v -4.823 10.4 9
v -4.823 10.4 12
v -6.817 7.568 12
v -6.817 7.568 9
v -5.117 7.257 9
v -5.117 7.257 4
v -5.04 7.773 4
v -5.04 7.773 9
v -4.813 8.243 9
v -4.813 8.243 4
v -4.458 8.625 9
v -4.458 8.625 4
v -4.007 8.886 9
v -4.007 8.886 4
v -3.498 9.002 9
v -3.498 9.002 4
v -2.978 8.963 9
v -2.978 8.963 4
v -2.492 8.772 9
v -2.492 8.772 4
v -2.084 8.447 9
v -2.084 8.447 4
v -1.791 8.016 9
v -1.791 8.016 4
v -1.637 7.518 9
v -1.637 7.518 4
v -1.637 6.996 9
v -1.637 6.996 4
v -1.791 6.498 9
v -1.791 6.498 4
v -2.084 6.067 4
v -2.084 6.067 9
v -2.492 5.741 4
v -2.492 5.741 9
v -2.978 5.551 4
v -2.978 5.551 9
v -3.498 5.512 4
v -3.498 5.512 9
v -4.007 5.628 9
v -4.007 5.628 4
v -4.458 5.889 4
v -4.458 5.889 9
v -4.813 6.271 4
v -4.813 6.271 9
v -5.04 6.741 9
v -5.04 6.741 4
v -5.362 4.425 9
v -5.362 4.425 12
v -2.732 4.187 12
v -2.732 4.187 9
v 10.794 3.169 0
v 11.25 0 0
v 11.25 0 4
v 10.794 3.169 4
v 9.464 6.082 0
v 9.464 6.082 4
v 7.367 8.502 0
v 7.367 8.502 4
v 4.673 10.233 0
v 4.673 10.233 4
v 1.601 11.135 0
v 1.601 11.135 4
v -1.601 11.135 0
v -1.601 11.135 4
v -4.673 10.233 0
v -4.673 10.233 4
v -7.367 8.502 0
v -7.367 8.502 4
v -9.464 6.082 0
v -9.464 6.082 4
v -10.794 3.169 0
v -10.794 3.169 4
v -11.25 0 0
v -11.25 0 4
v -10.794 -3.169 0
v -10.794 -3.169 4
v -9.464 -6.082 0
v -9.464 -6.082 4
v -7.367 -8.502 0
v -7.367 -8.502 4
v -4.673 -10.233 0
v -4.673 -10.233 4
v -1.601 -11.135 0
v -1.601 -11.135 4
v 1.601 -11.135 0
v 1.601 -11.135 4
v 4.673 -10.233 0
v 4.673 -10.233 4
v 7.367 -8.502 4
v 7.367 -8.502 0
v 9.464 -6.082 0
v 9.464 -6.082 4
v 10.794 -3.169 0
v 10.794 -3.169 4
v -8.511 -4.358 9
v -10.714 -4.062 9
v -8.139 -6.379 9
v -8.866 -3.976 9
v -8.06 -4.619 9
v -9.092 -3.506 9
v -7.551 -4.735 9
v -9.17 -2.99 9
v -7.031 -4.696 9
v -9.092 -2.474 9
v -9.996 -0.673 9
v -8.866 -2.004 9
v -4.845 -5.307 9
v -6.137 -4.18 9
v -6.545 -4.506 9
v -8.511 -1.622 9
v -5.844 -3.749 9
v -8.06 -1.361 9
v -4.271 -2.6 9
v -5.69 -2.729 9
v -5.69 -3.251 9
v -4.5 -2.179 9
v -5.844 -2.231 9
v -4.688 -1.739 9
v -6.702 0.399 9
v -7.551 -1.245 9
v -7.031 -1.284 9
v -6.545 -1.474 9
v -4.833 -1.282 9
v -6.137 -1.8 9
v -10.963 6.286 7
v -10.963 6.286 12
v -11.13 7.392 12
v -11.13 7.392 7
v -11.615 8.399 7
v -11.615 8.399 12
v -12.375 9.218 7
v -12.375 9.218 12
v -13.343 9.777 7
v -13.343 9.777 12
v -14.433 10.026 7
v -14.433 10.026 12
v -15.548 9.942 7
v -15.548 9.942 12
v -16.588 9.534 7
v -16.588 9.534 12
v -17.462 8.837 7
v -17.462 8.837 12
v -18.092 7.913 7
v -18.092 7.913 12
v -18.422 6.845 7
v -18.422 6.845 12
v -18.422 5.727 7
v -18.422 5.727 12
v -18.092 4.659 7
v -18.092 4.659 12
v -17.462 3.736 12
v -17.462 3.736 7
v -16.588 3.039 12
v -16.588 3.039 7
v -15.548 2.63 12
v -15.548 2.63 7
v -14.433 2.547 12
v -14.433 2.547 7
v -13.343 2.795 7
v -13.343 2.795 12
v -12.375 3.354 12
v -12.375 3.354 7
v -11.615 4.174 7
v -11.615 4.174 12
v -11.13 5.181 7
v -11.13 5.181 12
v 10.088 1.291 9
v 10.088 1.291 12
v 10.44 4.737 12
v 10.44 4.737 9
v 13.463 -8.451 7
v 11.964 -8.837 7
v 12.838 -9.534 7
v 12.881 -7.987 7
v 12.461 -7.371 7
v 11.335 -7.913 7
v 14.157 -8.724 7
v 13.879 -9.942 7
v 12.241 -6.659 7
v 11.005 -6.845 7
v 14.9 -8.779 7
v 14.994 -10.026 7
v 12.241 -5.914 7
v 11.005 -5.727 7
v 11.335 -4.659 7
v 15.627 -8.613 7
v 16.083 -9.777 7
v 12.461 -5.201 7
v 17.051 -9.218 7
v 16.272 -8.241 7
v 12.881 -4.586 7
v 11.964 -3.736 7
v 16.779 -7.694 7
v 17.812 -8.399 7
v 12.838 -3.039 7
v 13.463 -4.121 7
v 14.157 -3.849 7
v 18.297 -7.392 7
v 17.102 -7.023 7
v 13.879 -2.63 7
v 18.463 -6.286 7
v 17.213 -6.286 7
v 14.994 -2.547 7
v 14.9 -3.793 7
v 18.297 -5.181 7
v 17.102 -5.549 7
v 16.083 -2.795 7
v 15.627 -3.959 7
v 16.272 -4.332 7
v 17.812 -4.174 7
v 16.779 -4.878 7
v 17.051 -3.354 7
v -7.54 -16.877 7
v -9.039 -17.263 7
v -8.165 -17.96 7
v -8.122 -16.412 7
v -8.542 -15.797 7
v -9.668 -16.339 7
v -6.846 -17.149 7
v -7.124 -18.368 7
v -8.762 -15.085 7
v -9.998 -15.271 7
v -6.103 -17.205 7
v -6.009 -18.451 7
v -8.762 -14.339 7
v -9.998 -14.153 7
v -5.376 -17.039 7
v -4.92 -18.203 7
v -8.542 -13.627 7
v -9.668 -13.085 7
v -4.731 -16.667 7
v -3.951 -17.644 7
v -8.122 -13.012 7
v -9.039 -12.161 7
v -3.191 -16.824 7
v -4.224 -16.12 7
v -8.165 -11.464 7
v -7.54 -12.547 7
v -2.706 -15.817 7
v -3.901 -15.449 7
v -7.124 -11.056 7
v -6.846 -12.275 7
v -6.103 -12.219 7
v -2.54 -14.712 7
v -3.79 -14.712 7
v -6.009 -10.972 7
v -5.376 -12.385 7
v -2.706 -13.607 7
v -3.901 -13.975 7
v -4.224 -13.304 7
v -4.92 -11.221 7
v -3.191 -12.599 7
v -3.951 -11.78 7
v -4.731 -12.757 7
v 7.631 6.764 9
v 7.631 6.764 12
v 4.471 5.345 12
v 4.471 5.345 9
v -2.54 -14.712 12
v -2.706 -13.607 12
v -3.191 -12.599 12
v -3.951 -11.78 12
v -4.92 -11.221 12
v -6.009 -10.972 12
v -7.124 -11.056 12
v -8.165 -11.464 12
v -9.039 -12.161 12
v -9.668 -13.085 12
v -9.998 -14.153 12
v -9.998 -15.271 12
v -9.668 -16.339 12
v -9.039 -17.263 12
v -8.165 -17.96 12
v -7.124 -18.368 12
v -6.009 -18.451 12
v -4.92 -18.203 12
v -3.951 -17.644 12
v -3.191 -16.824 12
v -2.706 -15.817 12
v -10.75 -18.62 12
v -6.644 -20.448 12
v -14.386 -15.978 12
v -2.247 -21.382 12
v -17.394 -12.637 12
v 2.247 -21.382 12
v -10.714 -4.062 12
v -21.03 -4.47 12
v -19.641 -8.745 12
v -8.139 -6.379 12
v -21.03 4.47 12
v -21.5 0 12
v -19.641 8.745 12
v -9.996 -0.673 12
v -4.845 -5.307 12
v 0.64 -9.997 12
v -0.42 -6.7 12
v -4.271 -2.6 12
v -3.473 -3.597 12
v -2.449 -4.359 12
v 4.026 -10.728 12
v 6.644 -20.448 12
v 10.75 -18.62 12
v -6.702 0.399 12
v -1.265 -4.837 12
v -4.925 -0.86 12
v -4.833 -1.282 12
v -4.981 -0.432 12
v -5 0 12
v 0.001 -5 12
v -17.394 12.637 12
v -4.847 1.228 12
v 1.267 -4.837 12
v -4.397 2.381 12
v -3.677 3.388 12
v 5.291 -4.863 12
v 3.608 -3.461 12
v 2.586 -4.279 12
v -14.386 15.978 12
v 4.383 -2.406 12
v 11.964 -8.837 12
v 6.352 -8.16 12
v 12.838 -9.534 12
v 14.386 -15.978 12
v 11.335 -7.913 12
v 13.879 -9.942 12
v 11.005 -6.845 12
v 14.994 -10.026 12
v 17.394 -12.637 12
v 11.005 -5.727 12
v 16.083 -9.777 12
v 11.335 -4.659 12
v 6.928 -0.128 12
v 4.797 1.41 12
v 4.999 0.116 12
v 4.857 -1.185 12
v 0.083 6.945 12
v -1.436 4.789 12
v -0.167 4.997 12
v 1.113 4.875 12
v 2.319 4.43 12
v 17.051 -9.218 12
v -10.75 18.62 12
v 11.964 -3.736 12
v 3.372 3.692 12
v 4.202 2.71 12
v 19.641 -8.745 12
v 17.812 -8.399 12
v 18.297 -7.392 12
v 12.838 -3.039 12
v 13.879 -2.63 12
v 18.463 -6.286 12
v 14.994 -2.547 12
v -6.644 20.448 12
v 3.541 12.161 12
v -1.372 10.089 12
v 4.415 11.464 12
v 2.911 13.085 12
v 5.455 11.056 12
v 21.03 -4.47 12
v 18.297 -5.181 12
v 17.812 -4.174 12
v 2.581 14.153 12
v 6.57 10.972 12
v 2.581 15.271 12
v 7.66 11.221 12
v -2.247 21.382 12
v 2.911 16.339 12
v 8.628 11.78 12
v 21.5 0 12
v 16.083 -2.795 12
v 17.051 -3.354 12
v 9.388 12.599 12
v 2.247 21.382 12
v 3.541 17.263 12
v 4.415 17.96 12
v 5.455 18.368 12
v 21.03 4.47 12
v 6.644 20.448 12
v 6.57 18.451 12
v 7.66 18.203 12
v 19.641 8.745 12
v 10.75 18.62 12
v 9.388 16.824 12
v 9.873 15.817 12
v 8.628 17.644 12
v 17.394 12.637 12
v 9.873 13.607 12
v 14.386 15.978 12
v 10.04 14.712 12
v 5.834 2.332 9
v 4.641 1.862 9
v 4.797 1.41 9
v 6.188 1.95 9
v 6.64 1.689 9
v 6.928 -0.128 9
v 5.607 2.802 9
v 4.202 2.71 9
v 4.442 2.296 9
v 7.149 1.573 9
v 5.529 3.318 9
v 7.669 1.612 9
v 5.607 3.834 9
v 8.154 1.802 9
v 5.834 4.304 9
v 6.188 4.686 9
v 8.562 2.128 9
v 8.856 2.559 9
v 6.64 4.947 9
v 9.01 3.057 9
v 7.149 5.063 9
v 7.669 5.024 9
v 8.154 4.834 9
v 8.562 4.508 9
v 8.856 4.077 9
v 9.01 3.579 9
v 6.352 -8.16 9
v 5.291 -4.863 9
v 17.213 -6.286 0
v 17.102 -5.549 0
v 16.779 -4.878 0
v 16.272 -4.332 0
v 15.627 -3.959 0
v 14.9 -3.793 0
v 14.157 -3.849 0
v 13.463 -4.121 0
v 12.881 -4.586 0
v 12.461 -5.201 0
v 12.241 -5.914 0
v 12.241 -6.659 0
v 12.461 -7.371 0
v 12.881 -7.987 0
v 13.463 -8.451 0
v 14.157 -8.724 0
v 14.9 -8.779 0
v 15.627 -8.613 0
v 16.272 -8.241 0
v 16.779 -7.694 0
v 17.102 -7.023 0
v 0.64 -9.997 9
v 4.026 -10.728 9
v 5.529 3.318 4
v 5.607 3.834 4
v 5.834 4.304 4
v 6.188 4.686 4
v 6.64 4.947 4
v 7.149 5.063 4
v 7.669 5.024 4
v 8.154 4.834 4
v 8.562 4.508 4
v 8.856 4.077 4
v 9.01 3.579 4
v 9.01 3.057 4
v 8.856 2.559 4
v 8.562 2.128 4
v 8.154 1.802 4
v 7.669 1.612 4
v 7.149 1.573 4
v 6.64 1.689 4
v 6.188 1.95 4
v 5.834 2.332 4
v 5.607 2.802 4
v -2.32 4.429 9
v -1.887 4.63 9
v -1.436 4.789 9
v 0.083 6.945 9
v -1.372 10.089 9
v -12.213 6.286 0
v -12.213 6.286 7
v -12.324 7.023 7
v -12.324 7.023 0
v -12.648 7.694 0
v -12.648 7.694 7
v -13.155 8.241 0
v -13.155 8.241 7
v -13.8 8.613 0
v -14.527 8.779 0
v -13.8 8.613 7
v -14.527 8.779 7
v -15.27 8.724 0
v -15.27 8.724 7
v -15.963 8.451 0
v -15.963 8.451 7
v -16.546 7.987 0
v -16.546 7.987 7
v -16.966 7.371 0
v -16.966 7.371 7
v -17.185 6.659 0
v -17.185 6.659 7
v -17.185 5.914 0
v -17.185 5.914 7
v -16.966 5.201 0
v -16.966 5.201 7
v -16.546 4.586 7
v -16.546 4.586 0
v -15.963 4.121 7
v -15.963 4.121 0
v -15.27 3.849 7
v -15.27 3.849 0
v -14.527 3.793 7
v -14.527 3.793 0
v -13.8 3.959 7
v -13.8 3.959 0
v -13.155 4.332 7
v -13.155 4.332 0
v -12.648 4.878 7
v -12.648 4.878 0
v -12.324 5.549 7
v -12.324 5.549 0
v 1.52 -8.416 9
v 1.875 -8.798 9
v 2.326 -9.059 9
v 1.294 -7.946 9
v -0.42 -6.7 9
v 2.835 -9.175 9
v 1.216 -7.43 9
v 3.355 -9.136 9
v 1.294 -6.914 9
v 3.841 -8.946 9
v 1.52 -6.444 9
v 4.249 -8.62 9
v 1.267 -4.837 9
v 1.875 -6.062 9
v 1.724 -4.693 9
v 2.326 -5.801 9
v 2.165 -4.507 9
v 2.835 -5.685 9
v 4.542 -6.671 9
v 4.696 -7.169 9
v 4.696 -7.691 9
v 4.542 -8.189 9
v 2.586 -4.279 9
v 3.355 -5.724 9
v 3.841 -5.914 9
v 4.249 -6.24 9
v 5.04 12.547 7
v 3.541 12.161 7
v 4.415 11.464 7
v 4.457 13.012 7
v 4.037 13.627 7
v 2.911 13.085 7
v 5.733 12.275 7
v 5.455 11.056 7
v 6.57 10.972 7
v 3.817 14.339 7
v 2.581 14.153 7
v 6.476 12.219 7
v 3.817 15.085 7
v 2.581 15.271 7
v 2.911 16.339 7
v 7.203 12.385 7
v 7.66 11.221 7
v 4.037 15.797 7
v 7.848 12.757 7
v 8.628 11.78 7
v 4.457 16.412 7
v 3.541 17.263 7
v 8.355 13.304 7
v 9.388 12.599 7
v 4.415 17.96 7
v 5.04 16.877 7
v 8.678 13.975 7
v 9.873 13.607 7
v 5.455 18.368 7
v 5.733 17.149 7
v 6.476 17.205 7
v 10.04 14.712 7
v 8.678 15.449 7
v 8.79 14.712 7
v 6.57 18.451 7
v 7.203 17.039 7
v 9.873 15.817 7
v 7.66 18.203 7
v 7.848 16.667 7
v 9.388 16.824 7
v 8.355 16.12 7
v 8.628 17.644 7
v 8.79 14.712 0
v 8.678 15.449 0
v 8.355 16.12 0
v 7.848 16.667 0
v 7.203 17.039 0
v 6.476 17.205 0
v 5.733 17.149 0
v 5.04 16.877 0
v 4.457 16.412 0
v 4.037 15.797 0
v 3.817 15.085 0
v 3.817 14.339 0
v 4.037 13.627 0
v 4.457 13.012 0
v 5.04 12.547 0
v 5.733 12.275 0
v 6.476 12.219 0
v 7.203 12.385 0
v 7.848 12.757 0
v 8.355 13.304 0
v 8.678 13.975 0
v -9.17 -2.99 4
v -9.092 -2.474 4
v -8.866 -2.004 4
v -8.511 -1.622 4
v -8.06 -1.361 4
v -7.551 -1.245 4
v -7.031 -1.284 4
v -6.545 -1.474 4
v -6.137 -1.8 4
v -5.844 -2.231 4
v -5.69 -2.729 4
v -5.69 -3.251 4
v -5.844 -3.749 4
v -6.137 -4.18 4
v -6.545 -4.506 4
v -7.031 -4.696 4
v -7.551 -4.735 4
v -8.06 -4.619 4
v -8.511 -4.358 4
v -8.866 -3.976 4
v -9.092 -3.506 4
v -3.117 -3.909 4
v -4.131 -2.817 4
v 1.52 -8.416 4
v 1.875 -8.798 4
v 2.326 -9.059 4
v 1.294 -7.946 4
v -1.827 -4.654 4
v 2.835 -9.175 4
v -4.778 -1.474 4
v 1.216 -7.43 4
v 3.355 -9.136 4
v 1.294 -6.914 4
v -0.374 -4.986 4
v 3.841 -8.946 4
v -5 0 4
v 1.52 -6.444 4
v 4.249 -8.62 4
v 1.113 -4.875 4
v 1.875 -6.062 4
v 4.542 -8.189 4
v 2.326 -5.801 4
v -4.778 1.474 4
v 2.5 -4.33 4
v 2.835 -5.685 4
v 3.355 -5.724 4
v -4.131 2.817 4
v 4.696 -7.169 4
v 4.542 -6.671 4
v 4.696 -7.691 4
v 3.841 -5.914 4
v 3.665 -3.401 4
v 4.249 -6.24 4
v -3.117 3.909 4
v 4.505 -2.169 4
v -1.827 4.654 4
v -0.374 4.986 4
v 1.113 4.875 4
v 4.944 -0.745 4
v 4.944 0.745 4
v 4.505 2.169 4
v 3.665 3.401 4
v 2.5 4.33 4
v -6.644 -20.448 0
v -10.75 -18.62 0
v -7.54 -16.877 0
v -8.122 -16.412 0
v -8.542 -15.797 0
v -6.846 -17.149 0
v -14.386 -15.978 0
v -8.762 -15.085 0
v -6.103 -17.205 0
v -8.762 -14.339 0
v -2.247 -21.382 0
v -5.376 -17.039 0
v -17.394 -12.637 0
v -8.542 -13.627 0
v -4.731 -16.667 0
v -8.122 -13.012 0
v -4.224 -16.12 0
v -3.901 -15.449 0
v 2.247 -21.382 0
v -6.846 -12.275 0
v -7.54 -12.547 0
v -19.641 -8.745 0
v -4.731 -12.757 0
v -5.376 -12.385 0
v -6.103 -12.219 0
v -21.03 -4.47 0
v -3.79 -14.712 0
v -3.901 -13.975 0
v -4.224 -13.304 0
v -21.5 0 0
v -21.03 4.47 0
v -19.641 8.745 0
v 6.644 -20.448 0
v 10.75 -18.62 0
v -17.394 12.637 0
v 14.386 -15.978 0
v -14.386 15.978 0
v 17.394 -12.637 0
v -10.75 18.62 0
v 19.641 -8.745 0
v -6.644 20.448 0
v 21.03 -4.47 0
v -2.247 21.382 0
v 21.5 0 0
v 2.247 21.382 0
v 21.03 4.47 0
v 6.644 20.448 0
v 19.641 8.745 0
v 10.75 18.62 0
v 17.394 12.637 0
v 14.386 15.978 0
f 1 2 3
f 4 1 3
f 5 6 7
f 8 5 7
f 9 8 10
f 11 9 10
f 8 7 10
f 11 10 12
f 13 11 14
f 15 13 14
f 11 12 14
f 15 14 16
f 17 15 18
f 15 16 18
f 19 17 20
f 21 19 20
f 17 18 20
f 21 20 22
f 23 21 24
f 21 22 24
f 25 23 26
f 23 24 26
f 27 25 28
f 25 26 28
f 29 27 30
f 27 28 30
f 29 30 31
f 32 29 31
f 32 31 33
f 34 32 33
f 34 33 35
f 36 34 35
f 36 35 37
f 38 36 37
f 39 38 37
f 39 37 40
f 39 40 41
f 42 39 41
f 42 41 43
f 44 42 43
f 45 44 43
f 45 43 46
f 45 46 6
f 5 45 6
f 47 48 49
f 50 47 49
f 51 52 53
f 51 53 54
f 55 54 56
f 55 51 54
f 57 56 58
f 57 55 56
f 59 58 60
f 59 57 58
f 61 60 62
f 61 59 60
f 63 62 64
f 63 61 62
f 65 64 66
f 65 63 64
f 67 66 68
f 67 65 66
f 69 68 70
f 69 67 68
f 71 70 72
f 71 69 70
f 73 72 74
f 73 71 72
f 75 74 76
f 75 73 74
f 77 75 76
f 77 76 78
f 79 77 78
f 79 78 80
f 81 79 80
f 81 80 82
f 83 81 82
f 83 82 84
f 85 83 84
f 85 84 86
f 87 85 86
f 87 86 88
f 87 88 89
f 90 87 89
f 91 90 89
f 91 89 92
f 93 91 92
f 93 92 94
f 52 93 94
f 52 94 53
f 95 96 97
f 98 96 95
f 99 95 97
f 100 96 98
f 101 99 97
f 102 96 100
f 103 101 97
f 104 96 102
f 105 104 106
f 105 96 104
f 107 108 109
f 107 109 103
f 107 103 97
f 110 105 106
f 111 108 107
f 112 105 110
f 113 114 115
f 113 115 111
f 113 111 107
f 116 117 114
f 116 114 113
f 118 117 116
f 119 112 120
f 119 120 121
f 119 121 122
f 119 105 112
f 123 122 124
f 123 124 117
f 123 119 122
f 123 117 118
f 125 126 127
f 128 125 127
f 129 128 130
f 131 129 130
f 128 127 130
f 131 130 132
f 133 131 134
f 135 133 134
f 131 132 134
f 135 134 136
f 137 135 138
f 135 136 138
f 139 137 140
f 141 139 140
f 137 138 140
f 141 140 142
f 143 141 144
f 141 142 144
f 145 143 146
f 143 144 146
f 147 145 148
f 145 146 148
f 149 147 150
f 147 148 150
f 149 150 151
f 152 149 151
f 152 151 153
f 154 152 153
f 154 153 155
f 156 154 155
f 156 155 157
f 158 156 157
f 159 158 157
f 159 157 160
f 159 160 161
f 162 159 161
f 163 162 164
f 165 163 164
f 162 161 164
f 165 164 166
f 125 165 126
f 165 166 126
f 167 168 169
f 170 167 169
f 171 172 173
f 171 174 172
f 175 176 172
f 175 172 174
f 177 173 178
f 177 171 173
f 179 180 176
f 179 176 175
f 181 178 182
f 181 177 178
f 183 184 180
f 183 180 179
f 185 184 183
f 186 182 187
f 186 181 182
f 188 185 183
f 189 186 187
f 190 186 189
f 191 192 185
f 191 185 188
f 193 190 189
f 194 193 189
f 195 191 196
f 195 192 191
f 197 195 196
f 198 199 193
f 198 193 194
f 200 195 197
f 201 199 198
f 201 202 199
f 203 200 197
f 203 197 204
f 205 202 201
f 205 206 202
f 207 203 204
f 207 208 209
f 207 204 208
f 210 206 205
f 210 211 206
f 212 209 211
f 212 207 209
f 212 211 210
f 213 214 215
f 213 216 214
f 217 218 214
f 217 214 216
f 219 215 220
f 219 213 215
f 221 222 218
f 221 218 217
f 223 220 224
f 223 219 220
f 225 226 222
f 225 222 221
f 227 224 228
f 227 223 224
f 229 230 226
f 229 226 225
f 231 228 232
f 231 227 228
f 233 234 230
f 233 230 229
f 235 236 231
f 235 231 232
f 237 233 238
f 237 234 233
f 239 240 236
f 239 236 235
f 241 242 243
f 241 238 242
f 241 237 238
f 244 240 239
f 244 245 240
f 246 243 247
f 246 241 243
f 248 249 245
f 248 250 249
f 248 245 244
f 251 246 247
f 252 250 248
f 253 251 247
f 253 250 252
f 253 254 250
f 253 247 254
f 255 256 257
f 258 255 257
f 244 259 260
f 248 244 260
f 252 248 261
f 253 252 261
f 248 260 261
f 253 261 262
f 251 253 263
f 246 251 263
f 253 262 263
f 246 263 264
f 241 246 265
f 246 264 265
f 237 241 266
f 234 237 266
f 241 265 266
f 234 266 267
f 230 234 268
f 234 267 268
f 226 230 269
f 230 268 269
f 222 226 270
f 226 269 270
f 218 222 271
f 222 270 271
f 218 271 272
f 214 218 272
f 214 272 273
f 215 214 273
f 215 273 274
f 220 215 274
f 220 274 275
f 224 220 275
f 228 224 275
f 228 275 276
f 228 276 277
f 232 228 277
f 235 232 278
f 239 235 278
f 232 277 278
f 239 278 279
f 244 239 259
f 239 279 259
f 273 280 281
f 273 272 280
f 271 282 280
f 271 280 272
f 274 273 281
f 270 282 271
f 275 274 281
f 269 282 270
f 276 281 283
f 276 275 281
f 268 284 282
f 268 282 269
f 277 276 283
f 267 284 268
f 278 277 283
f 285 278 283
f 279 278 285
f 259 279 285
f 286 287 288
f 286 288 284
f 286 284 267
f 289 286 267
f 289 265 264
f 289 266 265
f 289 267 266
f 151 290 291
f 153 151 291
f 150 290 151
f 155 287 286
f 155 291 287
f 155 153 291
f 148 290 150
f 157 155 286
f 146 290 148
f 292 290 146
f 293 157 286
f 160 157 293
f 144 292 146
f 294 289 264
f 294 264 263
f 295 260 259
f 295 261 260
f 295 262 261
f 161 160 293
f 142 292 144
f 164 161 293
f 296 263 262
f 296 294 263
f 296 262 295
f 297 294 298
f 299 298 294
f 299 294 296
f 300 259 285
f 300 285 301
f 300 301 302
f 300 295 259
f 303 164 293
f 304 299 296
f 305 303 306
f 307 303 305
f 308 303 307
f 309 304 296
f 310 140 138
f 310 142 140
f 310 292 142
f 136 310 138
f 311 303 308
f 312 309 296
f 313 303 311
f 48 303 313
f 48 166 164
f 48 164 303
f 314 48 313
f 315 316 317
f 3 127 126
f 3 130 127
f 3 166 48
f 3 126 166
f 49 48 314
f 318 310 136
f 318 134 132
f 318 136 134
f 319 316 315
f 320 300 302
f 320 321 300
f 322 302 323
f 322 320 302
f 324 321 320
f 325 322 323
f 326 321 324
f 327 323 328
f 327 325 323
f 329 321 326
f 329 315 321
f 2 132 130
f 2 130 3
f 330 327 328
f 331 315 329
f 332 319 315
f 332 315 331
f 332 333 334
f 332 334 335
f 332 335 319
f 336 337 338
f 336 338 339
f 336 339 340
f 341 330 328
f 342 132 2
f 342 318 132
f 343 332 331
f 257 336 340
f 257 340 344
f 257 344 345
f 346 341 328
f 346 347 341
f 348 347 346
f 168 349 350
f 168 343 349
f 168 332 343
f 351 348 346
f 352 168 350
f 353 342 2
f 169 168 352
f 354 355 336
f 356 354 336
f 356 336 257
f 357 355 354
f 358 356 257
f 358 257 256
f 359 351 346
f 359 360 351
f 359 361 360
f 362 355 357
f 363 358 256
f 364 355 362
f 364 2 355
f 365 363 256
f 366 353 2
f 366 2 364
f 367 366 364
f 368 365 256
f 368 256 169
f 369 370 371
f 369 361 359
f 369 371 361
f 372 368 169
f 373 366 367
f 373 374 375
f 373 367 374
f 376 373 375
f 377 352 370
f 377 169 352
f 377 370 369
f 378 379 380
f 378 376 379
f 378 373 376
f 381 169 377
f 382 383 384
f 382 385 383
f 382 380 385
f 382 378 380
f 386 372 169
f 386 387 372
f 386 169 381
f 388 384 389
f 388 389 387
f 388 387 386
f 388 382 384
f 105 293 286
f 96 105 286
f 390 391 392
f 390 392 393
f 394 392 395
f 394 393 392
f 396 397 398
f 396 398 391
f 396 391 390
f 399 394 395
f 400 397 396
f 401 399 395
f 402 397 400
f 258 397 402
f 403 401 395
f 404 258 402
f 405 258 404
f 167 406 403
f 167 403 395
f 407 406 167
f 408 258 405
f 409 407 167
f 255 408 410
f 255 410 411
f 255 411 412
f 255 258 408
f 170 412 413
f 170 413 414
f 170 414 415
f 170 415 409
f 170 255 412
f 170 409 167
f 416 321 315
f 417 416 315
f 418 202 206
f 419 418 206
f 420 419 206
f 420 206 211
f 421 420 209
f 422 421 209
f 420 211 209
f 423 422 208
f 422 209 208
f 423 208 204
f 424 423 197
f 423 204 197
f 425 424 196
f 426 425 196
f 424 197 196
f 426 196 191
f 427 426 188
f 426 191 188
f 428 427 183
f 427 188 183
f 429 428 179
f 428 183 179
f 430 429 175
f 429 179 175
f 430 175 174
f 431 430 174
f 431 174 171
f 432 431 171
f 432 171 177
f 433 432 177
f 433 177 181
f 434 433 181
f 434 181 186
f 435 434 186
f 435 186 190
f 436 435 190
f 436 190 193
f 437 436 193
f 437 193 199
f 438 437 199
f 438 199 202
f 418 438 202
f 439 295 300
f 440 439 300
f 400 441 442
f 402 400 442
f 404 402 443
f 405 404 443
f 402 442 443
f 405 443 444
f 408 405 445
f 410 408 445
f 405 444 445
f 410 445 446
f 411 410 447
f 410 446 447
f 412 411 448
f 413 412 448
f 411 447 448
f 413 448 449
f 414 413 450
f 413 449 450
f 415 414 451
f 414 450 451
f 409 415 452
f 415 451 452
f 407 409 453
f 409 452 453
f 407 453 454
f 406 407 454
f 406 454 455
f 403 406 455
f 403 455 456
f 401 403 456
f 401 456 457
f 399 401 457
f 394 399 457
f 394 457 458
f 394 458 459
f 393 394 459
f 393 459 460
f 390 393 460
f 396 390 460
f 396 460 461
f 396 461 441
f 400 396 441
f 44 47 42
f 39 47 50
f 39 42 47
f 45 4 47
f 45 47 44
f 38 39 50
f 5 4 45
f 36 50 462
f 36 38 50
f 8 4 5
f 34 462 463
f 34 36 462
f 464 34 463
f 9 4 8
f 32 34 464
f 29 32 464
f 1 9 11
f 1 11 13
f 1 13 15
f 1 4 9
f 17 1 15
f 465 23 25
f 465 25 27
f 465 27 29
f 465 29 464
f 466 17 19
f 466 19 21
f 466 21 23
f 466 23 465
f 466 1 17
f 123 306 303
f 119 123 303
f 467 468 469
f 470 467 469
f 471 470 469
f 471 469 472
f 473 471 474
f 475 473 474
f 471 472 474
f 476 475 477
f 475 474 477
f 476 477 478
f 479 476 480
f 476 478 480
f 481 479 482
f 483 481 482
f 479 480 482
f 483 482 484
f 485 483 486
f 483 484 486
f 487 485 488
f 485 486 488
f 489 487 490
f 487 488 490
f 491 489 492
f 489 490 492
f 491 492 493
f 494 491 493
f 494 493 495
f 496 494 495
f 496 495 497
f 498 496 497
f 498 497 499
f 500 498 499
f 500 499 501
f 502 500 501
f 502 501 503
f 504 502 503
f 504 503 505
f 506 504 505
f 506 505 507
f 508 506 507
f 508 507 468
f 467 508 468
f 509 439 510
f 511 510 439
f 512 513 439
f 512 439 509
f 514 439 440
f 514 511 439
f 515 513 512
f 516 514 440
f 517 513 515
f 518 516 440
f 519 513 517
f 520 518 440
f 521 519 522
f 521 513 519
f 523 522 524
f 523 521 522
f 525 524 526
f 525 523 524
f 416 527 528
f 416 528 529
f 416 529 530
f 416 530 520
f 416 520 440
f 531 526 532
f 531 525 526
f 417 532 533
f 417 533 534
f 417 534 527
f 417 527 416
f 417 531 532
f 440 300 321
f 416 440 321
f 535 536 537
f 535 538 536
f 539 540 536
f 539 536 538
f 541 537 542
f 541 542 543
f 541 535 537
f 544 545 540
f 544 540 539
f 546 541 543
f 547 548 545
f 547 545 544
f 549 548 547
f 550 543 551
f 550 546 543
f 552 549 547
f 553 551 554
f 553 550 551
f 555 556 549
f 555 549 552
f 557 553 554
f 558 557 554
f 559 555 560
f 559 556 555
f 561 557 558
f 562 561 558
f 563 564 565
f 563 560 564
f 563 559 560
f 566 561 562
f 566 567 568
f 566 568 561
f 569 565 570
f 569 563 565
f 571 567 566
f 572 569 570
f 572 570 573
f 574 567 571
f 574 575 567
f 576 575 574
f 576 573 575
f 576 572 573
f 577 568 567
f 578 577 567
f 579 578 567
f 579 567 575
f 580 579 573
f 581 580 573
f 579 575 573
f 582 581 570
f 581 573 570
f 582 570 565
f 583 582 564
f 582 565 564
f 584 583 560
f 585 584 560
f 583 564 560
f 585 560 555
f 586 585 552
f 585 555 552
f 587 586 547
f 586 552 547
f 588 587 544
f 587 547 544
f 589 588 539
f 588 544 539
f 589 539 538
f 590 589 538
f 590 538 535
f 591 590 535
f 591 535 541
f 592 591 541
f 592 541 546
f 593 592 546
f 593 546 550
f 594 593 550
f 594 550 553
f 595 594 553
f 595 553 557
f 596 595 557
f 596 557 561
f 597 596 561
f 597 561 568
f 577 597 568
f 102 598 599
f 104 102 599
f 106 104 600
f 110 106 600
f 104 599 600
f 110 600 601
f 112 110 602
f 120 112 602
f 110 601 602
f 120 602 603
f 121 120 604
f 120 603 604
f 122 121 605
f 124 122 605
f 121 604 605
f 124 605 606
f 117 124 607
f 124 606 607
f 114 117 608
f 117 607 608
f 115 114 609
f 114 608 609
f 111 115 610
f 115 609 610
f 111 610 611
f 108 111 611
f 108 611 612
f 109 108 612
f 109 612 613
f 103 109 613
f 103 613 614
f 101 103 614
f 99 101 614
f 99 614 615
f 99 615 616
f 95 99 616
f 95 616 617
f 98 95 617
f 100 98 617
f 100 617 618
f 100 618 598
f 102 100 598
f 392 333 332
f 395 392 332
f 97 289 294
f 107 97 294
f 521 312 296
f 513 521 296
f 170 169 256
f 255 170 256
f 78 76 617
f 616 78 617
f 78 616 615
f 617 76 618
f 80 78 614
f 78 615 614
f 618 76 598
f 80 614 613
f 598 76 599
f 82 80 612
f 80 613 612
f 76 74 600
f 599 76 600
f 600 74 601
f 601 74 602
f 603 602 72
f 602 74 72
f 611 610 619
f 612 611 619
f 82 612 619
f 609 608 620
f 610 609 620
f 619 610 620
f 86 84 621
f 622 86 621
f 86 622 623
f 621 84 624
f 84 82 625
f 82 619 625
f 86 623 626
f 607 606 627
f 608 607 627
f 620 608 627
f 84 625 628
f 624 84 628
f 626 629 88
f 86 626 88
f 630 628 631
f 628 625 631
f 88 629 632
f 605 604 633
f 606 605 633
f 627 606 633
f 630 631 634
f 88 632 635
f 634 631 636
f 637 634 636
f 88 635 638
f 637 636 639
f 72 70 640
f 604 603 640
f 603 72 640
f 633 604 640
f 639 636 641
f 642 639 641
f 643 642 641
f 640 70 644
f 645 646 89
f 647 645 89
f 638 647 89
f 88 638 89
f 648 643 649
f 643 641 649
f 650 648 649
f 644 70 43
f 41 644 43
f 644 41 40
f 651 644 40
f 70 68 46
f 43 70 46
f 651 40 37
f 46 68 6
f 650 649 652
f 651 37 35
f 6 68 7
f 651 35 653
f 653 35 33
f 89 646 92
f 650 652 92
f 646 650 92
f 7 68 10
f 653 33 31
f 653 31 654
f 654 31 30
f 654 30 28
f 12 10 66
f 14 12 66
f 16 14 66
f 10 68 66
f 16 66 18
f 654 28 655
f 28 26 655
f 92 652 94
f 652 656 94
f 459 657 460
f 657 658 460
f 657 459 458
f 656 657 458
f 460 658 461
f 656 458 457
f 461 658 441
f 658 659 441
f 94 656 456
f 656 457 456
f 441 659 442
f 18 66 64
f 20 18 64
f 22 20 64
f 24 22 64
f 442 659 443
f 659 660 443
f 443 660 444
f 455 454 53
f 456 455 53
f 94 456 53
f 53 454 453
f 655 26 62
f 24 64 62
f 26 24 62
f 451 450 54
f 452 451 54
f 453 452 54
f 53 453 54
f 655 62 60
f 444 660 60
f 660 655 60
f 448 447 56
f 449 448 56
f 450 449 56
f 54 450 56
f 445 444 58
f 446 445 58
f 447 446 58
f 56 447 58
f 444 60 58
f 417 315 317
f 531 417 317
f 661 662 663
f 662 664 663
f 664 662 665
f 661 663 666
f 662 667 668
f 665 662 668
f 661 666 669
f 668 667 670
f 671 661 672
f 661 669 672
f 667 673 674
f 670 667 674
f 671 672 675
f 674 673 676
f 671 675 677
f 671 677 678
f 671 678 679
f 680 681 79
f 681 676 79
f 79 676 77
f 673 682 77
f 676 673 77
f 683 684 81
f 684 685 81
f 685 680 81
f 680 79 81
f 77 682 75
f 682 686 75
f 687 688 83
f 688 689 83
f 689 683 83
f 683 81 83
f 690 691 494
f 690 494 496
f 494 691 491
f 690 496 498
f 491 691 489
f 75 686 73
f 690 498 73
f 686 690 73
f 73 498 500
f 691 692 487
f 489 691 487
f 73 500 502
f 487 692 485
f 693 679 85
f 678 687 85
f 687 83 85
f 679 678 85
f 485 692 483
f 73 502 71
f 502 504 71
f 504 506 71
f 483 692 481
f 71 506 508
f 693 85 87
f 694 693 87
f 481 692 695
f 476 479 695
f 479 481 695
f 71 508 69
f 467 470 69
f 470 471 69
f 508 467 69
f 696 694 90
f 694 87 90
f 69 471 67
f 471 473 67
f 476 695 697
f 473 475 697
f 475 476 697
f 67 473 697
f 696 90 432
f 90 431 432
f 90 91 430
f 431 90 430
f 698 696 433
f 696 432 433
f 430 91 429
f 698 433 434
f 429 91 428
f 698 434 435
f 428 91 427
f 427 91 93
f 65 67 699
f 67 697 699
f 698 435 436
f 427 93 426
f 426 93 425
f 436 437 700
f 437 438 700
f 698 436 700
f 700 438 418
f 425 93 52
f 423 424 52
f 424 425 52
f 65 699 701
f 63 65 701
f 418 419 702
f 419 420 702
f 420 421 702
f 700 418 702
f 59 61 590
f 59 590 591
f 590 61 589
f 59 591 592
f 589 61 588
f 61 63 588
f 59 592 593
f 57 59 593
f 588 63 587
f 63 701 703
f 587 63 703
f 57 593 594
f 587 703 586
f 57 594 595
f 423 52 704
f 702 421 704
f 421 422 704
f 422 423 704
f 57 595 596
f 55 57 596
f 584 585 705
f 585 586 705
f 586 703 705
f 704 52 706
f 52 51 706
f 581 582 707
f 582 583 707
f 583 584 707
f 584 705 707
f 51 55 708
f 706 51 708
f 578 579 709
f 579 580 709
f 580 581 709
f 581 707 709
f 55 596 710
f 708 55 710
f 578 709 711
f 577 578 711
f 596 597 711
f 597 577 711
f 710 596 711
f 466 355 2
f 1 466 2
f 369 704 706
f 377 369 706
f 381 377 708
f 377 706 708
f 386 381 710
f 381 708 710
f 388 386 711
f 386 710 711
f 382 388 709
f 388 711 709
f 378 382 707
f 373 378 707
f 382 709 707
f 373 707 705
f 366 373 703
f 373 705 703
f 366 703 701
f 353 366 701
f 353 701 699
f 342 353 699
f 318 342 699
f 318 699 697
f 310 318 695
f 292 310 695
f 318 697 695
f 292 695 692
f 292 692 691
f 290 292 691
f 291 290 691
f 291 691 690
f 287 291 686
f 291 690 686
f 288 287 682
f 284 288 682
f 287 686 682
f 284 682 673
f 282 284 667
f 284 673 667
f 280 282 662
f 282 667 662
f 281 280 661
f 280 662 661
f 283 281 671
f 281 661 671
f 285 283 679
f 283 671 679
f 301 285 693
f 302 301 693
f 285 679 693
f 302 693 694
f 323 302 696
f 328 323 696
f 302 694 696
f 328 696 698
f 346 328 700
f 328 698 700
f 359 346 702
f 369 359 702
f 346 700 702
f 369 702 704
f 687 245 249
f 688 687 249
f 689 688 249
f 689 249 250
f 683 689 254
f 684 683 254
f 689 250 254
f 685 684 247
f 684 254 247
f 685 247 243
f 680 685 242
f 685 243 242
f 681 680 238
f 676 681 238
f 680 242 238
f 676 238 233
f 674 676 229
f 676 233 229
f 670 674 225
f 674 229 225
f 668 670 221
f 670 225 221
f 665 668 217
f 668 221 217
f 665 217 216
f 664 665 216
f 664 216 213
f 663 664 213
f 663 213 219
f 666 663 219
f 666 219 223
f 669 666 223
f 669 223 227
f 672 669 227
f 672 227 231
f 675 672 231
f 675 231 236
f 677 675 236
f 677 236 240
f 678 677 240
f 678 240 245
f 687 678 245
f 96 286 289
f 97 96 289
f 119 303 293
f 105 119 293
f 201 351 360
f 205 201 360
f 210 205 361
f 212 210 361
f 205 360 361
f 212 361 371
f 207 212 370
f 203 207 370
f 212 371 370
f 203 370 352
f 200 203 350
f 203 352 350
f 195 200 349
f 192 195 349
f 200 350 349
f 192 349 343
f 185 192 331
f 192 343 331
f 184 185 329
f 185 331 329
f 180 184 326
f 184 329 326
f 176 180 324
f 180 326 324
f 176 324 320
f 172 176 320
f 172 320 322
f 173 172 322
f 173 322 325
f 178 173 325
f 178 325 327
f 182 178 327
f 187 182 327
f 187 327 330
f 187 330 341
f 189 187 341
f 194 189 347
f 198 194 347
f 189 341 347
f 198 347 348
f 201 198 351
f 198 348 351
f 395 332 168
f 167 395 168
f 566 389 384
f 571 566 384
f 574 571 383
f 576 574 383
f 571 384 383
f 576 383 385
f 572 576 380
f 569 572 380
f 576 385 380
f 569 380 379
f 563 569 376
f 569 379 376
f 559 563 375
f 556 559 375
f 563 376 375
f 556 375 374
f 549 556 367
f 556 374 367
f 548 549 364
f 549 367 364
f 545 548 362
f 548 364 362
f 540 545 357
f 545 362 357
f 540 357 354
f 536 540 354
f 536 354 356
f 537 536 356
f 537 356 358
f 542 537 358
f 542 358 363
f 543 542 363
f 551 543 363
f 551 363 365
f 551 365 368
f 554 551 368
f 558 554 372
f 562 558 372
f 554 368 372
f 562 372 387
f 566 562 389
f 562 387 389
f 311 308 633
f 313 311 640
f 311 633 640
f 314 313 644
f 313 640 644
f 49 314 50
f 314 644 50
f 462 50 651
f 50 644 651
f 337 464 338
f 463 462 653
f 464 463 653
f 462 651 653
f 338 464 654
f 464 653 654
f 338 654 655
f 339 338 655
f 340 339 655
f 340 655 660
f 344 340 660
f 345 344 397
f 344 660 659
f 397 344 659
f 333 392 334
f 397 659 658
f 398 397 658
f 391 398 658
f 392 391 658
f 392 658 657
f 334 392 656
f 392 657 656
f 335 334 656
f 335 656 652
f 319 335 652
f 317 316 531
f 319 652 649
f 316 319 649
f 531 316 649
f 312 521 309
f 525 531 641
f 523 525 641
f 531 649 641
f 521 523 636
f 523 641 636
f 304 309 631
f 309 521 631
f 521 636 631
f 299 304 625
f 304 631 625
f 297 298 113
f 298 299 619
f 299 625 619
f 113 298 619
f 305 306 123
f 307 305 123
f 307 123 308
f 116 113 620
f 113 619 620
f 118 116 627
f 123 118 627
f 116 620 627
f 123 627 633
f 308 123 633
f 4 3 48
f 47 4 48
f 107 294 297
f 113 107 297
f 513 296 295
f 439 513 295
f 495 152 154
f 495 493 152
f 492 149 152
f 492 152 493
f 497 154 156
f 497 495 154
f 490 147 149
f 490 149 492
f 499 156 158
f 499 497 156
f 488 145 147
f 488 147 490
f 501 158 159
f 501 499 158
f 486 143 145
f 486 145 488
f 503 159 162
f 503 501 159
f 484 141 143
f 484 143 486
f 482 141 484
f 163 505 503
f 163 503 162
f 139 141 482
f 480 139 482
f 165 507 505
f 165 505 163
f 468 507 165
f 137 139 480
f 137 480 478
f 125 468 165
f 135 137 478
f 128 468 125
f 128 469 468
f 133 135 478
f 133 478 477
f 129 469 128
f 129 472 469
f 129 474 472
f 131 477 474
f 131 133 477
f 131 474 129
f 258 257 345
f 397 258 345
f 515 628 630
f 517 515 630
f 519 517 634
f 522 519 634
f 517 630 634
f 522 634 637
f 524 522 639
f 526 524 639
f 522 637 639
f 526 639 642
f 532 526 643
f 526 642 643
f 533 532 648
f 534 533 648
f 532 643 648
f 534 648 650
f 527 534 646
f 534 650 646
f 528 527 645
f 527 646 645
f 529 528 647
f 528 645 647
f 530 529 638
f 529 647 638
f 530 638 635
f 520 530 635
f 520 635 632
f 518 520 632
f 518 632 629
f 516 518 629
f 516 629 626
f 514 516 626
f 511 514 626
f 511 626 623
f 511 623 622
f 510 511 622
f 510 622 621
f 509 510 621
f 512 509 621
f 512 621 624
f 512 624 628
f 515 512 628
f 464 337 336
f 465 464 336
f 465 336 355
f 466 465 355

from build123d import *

# Parameters (mm, degrees)
ESQUISSE1_R             = 21.5
ESQUISSE1_R_2           = 11.25
BOSS_EXTRU_1_DEPTH      = 12
ESQUISSE2_R             = 2.5
ENL_V_MAT_EXTRU_1_DEPTH = 33.687918257
ESQUISSE4_R             = 3.75
ENL_V_MAT_EXTRU_2_DEPTH = 5
BOSS_EXTRU_2_START      = -8
ESQUISSE5_R             = 11.25
BOSS_EXTRU_2_DEPTH      = 8
ESQUISSE6_R             = 5
ENL_V_MAT_EXTRU_3_DEPTH = 50
ESQUISSE7_R             = 1.75
ENL_V_MAT_EXTRU_4_DEPTH = 11
ENL_V_MAT_EXTRU_5_DEPTH = 3


with BuildPart() as part:
    # Esquisse1 → Boss.-Extru.1 (new body)
    with BuildSketch(Plane.XY):
        Circle(ESQUISSE1_R)
        Circle(ESQUISSE1_R_2, mode=Mode.SUBTRACT)
    extrude(amount=BOSS_EXTRU_1_DEPTH)

    # Esquisse2 → Enlèv. mat.-Extru.1 (cut, through all)
    with BuildSketch(Plane.XY.offset(12)):
        with Locations((-14.713385832, 6.286197369)):
            Circle(ESQUISSE2_R)
        with Locations((6.28955657, 14.711950182)):
            Circle(ESQUISSE2_R)
        with Locations((14.713385832, -6.286197369)):
            Circle(ESQUISSE2_R)
        with Locations((-6.28955657, -14.711950182)):
            Circle(ESQUISSE2_R)
    extrude(amount=-ENL_V_MAT_EXTRU_1_DEPTH, mode=Mode.SUBTRACT)

    # Esquisse4 → Enlèv. mat.-Extru.2 (cut)
    with BuildSketch(Plane.XY.offset(12)):
        with Locations((-6.28955657, -14.711950182)):
            Circle(ESQUISSE4_R)
        with Locations((14.713385832, -6.286197369)):
            Circle(ESQUISSE4_R)
        with Locations((6.28955657, 14.711950182)):
            Circle(ESQUISSE4_R)
        with Locations((-14.713385832, 6.286197369)):
            Circle(ESQUISSE4_R)
    extrude(amount=-ENL_V_MAT_EXTRU_2_DEPTH, mode=Mode.SUBTRACT)

    # Esquisse5 → Boss.-Extru.2 (add)
    with BuildSketch(Plane.XY.offset(12).offset(BOSS_EXTRU_2_START)):
        Circle(ESQUISSE5_R)
    extrude(amount=BOSS_EXTRU_2_DEPTH)

    # Esquisse6 → Enlèv. mat.-Extru.3 (cut)
    with BuildSketch(Plane(origin=(0, 0, 4), x_dir=(-1, 0, 0), z_dir=(0, 0, -1))):
        Circle(ESQUISSE6_R)
    extrude(amount=-ENL_V_MAT_EXTRU_3_DEPTH, mode=Mode.SUBTRACT)

    # Esquisse7 → Enlèv. mat.-Extru.4 (cut)
    with BuildSketch(Plane(origin=(0, 0, 4), x_dir=(-1, 0, 0), z_dir=(0, 0, -1))):
        with Locations((7.420247562, -2.989970922)):
            Circle(ESQUISSE7_R)
        with Locations((-2.965758016, -7.429958236)):
            Circle(ESQUISSE7_R)
        with Locations((-7.27947207, 3.31802447)):
            Circle(ESQUISSE7_R)
        with Locations((3.367275567, 7.256821292)):
            Circle(ESQUISSE7_R)
    extrude(amount=-ENL_V_MAT_EXTRU_4_DEPTH, mode=Mode.SUBTRACT)

    # Esquisse8 → Enlèv. mat.-Extru.5 (cut)
    with BuildSketch(Plane.XY.offset(12)):
        Polygon((-6.817345267, 7.56830012), (-5.362058995, 4.4247127), (-1.911989294, 4.113233872), (0.082794134, 6.945342463), (-1.372492138, 10.088929883), (-4.822561839, 10.400408711), align=None)
        Polygon((7.630709315, 6.764273503), (4.470551482, 5.345329364), (4.119314237, 1.899080331), (6.928234824, -0.128224563), (10.088392657, 1.290719576), (10.439629903, 4.736968609), align=None)
        Polygon((6.351992849, -8.160309971), (5.291378589, -4.862568715), (1.905143756, -4.13221698), (-0.420476817, -6.699606501), (0.640137444, -9.997347757), (4.026372276, -10.727699492), align=None)
        Polygon((-6.701502779, 0.398746525), (-9.995590566, -0.673160957), (-10.71433535, -4.061878404), (-8.138992346, -6.378688369), (-4.844904559, -5.306780887), (-4.126159775, -1.91806344), align=None)
    extrude(amount=-ENL_V_MAT_EXTRU_5_DEPTH, mode=Mode.SUBTRACT)


solid = part.part
